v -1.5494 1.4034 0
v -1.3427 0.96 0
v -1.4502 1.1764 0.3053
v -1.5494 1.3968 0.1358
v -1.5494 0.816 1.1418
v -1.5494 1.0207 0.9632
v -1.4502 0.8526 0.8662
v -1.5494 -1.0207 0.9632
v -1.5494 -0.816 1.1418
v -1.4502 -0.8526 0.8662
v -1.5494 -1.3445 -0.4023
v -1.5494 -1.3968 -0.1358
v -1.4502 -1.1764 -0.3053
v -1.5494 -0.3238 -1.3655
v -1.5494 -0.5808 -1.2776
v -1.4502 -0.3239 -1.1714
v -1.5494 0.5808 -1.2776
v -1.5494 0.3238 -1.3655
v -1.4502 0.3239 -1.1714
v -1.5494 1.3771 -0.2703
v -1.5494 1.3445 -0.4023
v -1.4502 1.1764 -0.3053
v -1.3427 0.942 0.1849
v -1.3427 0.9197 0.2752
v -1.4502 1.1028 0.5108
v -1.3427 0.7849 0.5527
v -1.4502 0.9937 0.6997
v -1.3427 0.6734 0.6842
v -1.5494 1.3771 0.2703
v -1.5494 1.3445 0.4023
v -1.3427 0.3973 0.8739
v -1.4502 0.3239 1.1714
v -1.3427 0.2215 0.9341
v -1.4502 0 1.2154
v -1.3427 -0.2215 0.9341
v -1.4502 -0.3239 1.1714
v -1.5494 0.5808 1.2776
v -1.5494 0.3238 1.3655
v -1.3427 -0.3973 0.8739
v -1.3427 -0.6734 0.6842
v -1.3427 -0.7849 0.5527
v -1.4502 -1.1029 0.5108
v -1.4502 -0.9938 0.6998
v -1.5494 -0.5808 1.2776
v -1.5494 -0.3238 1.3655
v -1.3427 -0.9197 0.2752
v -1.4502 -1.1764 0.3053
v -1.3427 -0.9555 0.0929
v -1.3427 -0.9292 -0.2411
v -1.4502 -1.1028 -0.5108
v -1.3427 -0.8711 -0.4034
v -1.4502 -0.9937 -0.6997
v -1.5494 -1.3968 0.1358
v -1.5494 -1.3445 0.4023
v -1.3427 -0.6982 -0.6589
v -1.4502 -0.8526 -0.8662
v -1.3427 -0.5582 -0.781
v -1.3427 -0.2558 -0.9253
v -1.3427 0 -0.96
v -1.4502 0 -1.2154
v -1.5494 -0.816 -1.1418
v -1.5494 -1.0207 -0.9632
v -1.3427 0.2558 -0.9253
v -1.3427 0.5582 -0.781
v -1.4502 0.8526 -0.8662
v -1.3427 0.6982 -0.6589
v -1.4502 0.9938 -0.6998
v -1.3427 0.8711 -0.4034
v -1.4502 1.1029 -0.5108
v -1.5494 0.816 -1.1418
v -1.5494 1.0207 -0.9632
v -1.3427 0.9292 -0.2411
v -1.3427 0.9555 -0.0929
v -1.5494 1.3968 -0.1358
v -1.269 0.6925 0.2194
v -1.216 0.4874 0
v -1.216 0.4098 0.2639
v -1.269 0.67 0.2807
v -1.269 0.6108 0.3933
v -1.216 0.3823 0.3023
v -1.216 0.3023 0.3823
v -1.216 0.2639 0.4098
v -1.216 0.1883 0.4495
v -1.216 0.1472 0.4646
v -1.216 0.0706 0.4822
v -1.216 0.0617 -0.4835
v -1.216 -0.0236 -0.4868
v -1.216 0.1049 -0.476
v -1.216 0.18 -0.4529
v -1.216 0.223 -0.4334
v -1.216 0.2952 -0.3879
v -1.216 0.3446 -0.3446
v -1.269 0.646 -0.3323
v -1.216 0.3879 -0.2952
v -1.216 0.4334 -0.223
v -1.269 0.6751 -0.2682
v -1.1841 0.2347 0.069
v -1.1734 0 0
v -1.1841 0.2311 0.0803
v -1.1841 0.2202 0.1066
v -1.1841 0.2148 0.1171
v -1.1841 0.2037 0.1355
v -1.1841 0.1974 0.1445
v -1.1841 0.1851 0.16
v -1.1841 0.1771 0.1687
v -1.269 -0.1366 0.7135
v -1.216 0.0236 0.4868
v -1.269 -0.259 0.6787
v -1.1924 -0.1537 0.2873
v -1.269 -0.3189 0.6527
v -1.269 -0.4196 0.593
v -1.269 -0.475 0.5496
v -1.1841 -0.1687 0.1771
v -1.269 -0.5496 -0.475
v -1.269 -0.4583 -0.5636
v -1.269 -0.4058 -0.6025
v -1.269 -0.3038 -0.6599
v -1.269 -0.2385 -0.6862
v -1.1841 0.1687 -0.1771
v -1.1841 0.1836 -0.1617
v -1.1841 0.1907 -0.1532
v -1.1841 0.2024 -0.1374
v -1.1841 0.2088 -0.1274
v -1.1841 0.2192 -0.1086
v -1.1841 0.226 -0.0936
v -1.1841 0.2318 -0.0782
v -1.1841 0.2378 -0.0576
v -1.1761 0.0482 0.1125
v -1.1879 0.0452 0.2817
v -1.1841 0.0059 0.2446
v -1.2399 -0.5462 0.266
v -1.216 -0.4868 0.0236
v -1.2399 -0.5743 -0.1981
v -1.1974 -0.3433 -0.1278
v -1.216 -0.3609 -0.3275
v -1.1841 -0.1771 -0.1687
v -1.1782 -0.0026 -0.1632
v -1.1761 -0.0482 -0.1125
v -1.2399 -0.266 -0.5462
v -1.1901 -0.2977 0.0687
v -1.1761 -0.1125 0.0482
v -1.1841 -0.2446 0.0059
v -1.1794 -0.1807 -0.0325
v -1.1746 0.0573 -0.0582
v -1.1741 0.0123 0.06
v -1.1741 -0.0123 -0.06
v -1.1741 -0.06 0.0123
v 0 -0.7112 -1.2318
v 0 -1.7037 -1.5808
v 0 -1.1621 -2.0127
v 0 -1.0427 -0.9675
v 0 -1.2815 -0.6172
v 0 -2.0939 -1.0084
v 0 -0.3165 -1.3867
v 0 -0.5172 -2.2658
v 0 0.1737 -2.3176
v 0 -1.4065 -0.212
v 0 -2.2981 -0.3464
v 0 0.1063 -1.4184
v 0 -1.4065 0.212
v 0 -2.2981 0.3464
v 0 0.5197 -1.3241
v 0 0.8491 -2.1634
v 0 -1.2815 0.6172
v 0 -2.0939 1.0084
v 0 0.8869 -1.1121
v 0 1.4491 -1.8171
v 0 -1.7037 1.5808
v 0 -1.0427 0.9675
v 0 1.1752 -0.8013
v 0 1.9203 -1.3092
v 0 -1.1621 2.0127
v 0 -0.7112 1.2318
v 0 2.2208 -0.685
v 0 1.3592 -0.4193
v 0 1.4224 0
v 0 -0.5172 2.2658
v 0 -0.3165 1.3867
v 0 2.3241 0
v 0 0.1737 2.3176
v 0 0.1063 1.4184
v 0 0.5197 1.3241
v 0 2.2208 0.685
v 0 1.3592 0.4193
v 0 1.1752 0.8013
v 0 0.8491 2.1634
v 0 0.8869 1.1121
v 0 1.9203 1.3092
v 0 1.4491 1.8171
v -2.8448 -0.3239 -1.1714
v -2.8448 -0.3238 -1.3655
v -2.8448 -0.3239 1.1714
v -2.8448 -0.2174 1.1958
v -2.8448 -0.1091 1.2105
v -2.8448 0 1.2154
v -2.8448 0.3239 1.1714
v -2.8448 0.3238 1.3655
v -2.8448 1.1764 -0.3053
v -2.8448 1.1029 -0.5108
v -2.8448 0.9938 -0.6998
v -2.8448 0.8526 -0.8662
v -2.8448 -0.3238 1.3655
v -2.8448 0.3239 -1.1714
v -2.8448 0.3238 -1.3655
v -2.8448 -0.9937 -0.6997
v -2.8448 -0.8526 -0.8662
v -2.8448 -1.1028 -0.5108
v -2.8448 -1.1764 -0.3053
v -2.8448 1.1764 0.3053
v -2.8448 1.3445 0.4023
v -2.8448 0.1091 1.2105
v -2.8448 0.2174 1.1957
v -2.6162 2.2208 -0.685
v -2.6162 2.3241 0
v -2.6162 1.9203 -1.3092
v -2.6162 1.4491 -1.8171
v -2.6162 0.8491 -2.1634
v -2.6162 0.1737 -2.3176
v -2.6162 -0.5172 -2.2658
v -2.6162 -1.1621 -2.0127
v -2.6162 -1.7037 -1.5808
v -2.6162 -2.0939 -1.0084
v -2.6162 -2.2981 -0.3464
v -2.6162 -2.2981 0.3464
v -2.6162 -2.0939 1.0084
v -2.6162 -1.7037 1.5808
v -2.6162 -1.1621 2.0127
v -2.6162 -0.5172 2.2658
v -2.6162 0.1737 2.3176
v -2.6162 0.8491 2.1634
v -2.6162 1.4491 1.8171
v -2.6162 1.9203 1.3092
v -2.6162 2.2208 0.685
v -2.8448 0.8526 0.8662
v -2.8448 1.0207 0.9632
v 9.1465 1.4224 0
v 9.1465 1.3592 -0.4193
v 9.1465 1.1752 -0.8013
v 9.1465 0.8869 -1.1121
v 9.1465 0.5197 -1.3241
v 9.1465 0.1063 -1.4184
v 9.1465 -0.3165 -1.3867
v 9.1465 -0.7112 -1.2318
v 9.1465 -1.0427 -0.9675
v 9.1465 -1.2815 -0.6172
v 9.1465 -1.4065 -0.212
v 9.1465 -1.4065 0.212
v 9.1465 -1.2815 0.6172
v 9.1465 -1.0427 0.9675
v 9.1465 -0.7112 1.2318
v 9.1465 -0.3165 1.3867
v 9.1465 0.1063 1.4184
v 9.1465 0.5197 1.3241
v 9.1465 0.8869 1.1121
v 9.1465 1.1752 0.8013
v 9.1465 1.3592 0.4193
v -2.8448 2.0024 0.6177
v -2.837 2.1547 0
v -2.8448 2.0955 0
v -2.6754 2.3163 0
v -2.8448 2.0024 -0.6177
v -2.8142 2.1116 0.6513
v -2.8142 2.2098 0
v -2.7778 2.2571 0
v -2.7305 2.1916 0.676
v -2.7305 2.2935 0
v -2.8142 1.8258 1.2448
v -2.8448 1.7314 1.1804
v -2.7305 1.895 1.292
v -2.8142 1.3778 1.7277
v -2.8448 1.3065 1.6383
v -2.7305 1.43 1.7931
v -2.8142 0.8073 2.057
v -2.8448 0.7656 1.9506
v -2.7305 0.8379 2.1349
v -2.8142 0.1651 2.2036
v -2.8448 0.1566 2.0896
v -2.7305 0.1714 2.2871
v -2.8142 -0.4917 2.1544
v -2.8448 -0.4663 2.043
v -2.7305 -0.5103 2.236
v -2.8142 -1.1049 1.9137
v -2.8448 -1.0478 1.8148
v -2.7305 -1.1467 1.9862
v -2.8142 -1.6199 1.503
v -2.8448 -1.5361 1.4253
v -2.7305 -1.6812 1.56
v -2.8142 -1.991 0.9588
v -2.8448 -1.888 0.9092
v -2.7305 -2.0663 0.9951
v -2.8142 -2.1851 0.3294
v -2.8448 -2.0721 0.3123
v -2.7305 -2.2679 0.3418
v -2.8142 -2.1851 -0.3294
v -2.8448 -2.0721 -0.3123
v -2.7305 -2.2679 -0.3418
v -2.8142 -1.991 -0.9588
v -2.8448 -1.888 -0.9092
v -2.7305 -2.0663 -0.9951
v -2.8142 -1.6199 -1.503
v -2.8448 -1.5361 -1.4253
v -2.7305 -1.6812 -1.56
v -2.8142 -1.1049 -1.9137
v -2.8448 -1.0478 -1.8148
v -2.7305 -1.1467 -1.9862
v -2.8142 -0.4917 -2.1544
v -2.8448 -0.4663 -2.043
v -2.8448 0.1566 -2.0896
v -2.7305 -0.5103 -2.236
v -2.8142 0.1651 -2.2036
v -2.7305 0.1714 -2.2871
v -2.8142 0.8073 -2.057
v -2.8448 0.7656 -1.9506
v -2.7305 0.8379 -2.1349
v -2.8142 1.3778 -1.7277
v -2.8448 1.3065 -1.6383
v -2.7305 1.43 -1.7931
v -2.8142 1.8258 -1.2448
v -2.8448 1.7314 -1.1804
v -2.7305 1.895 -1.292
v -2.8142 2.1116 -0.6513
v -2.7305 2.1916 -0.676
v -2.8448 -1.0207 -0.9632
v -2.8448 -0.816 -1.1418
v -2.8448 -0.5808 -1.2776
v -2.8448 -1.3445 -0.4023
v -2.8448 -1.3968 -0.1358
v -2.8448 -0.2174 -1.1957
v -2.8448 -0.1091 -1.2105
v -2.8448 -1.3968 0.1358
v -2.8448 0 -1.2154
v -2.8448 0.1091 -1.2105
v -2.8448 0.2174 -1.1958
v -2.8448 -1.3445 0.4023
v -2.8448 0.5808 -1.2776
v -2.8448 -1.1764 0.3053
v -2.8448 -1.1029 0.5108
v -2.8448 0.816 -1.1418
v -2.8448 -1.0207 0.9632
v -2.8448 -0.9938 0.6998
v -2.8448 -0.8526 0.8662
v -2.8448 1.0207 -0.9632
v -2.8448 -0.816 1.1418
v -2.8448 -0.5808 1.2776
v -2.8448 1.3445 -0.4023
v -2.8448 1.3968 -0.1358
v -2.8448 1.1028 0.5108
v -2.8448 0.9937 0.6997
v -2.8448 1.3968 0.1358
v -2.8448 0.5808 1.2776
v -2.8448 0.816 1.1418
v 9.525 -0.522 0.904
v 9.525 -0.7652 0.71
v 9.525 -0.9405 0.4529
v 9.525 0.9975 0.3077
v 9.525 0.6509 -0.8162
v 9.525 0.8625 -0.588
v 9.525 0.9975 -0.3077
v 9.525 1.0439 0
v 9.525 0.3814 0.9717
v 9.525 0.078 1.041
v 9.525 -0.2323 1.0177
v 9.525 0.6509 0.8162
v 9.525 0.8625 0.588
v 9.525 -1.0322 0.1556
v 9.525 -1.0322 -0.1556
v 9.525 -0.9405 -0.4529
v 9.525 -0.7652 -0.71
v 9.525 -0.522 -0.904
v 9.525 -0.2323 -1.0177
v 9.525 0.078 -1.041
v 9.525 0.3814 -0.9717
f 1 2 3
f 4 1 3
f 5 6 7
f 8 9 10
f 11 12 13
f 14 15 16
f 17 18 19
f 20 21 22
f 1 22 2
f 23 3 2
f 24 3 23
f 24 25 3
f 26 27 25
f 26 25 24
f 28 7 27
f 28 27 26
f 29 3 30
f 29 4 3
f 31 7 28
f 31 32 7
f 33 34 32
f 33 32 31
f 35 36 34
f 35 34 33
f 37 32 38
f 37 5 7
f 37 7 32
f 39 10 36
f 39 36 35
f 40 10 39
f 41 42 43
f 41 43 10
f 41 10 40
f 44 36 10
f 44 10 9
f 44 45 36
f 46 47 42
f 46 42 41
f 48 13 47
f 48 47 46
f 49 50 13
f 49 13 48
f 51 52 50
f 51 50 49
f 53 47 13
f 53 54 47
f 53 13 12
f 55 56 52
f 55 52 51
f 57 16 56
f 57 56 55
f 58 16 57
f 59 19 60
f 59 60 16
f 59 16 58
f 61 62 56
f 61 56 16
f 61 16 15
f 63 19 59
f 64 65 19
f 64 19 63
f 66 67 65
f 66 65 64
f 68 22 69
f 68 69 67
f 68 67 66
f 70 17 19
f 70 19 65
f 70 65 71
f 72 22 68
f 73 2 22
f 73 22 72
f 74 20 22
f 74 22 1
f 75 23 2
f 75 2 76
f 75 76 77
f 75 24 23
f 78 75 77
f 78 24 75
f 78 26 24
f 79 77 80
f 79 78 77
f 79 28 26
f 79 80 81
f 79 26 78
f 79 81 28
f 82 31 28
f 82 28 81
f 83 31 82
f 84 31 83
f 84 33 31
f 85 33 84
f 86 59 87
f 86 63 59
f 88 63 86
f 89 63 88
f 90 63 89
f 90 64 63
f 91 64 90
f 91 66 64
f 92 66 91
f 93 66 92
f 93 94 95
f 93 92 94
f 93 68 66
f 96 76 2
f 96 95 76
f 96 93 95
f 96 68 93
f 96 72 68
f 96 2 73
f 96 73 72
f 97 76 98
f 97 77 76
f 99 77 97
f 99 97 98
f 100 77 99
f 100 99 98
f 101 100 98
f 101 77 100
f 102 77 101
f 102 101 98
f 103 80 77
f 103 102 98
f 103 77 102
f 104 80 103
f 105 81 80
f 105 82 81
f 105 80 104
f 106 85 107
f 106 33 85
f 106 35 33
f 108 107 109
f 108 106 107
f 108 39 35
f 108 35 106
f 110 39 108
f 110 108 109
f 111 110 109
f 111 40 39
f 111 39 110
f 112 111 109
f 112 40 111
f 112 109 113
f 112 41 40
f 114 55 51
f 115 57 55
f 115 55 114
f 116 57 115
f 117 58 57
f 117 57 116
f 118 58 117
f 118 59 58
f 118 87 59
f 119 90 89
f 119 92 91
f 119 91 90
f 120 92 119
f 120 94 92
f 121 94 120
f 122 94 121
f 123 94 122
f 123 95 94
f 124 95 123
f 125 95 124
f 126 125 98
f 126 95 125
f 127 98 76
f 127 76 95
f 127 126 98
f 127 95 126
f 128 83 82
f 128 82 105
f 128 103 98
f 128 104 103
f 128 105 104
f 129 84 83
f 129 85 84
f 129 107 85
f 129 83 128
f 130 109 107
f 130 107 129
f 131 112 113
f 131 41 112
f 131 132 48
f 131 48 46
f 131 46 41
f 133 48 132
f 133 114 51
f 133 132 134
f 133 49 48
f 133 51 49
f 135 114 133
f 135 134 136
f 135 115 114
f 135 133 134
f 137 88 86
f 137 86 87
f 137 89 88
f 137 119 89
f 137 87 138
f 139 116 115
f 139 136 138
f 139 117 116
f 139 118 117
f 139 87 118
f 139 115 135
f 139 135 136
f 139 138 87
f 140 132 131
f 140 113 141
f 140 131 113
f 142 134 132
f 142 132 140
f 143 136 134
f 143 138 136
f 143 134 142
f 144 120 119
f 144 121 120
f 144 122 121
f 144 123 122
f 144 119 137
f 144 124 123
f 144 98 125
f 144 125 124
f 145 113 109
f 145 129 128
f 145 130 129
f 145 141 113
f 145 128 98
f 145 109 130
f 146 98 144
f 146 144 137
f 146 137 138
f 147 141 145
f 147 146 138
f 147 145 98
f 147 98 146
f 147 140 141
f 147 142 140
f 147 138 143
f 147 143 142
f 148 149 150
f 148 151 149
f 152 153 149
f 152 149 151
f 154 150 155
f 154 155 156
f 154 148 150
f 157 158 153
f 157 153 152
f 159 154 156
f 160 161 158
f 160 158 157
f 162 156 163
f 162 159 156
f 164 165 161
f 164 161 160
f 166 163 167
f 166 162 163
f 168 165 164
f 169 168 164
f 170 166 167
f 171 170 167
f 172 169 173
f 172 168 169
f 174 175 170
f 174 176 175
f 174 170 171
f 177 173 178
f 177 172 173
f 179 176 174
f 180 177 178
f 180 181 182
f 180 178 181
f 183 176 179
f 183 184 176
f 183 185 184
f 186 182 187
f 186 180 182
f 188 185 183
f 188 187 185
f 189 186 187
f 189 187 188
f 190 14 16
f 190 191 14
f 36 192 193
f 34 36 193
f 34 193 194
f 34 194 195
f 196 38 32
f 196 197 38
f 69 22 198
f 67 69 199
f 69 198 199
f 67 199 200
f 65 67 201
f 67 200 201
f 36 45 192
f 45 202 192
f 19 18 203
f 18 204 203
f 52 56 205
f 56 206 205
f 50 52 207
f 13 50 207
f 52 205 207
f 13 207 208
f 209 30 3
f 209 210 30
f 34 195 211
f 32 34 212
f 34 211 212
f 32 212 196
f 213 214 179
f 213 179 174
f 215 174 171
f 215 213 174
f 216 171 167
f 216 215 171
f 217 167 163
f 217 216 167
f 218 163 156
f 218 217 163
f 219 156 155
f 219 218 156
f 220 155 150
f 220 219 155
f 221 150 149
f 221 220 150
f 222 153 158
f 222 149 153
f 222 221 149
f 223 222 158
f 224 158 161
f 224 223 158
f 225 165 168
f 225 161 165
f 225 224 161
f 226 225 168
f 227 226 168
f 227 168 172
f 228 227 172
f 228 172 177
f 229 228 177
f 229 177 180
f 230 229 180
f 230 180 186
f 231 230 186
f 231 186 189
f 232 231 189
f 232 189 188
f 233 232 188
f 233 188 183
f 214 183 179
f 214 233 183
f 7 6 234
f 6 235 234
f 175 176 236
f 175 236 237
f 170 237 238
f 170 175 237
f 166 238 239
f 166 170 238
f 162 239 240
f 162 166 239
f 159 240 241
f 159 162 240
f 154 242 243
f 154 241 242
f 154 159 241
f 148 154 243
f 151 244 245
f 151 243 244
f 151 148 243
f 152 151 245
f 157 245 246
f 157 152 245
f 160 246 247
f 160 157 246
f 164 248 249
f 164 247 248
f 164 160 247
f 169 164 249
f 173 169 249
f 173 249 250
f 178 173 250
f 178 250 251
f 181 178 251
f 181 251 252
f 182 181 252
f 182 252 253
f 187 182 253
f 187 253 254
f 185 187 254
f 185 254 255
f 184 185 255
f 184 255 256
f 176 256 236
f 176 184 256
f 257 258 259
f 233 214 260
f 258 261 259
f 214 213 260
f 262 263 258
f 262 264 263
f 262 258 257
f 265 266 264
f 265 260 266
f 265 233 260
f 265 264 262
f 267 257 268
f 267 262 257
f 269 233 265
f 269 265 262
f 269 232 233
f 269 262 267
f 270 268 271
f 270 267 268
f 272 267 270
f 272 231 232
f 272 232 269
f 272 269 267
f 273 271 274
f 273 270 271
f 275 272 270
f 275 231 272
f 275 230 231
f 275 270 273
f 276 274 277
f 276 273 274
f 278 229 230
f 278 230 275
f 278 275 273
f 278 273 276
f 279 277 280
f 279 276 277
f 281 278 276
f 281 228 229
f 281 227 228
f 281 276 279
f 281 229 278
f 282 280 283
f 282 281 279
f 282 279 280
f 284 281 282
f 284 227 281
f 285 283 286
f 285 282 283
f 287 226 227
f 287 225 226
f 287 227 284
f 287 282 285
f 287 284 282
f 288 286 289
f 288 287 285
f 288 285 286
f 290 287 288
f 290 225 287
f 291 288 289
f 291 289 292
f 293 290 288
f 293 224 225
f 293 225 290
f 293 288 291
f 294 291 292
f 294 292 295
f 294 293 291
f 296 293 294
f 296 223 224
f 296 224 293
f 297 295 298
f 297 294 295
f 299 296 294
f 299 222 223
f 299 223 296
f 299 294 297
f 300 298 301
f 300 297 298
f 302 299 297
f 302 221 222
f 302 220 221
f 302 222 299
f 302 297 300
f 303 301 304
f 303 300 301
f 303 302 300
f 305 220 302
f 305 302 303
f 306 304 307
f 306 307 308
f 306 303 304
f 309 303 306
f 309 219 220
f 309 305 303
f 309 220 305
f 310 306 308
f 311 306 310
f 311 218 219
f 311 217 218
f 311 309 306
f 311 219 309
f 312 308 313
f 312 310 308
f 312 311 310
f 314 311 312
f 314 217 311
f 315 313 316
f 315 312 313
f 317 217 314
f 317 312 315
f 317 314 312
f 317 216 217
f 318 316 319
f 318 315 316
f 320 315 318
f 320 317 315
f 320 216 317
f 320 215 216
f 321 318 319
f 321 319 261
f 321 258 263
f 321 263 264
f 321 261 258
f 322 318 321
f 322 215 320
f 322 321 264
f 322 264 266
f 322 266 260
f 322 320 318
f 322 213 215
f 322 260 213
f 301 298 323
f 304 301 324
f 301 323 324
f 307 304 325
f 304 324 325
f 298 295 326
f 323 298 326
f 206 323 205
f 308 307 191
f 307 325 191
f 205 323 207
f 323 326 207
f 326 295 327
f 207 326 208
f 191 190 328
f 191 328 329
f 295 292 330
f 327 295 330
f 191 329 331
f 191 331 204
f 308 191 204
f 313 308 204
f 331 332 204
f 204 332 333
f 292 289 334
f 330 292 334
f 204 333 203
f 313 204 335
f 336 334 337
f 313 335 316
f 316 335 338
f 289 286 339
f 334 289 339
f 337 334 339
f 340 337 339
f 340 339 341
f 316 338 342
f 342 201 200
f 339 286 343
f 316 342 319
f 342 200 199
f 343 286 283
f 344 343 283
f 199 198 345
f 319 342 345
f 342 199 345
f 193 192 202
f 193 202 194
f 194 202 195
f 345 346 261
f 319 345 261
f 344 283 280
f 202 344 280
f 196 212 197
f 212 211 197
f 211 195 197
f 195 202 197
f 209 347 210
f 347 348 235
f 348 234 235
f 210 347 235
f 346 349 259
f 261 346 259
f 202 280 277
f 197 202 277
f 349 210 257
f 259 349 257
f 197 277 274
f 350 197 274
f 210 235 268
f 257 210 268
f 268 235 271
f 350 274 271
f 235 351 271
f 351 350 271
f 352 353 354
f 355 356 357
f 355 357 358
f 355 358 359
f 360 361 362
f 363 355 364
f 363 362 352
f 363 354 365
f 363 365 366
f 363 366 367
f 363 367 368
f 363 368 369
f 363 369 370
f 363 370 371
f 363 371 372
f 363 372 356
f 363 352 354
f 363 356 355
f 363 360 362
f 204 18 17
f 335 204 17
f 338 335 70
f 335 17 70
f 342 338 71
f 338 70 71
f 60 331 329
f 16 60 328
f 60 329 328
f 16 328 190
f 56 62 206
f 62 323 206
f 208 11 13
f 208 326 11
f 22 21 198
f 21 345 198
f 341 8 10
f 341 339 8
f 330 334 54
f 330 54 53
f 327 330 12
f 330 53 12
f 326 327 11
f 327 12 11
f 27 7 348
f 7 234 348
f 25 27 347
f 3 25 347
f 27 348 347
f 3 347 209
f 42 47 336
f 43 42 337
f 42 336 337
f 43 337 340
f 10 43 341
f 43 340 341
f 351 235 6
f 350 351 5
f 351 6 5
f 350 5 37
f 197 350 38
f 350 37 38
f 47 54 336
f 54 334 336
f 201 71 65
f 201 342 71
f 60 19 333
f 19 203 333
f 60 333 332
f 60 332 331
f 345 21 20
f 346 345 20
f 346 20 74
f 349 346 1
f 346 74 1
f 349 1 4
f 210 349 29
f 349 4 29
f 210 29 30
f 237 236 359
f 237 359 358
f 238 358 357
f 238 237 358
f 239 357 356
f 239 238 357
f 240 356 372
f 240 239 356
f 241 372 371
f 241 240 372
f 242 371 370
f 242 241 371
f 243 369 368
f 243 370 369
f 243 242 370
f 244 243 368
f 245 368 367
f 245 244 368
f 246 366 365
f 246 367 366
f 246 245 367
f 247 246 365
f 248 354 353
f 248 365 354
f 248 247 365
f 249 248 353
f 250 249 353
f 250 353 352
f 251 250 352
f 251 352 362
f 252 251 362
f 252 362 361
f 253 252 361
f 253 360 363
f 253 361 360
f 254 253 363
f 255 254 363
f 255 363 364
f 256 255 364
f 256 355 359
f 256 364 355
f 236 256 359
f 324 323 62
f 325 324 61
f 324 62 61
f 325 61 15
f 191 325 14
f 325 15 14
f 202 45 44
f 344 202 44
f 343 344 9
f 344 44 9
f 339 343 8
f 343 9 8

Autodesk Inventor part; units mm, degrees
ref_plane "YZ Plane" through (0, 0, 0) normal (1, 0, 0) x (0, 1, 0)
sketch "Sketch1" plane through (0, 0, 0) normal (0, 0, 1) x (1, 0, 0)
  line L0 (-2.8448, 0) -> (9.525, 0)
  line L1 (9.525, 0) -> (9.525, 1.4224)
  line L2 (9.525, 1.4224) -> (0, 1.4224)
  line L3 (0, 1.4224) -> (0, 2.3241)
  line L4 (-7.3162, 0) -> (16.036, 0) projected
  line L5 (0, -0.4648) -> (0, 2.7889) projected
  line L6 (0, 2.3241) -> (-2.8448, 2.3241)
  line L7 (-2.8448, 0) -> (-2.8448, 2.3241)
  arc A0 (-1.1734, 0) -> (-1.5494, 1.4034) centre (-3.9802, 0) ccw
  line L8 (-2.8448, 1.4034) -> (-1.5494, 1.4034)
  line L9 (12.7, 1.4224) -> (0, 1.4224) construction
  dimension "d0" = 9.525
  dimension "d1" = 2.8448
  dimension "d2" = 2.8448
  dimension "d5" = 4.6482
  dimension "d13" = 2.8068
  dimension "d14" = 2.8068
  dimension "d15" = 1.2954
revolve "Body" add sketch "Sketch1" angle 360 about axis through (-2.8448, 0, 0) along (1, 0, 0) contours A0 L8 L7 L6 L3 L5 L0 | L5 L2 L1 L0
ref_plane "IDS_WORKPLANE{1}" through (-2.8448, 0, 0) normal (1, 0, 0) x (0, 0, -1)
sketch "Sketch2" plane through (-2.8448, 0, 0) normal (1, 0, 0) x (0, 0, -1)
  line L0 (0, -3.6027) -> (0, 5.3473) projected
  line L1 (5.6384, 0) -> (-3.6512, 0) projected
  circle A0 centre (0, 0) radius 2.3241 projected
  line L2 (1.3655, 0.3238) -> (1.1714, 0.3239)
  line L3 (0, 0) -> (1.3655, 0.3238) construction
  line L4 (0, 0) -> (4.3113, 4.0687) construction
  line L5 (0, 0) -> (0.4023, 1.3445) construction
  line L6 (0, 0) -> (0.7017, 1.2154) construction
  line L7 (0.4023, 1.3445) -> (0.3053, 1.1764)
  line L8 (0.9632, 1.0207) -> (0.8662, 0.8526)
  line L9 (0, 0) -> (0.9632, 1.0207) construction
  arc A1 (1.2154, 0) -> (1.1714, 0.3239) centre (0, 0) ccw
  arc A2 (0.8662, 0.8526) -> (0.3053, 1.1764) centre (0, 0) ccw
  arc A3 (1.4034, 0) -> (1.3655, 0.3238) centre (0, 0) ccw
  arc A4 (0.9632, 1.0207) -> (0.4023, 1.3445) centre (0, 0) ccw
  arc A5 (1.3655, 0.3238) -> (0.8276, 1.1334) centre (0, 0) ccw construction
  arc A6 (1.1714, 0.3239) -> (0.8662, 0.8526) centre (0, 0) ccw construction
  line L10 (1.3655, -0.3238) -> (1.1714, -0.3239)
  line L11 (0.4023, -1.3445) -> (0.3053, -1.1764)
  line L12 (0.9632, -1.0207) -> (0.8662, -0.8526)
  arc A7 (1.1714, -0.3239) -> (1.2154, 0) centre (0, 0) ccw
  arc A8 (0.3053, -1.1764) -> (0.8662, -0.8526) centre (0, 0) ccw
  arc A9 (1.3655, -0.3238) -> (1.4034, 0) centre (0, 0) ccw
  arc A10 (0.4023, -1.3445) -> (0.9632, -1.0207) centre (0, 0) ccw
  line L13 (-1.3655, 0.3238) -> (-1.1714, 0.3239)
  line L14 (-0.4023, 1.3445) -> (-0.3053, 1.1764)
  line L15 (-0.9632, 1.0207) -> (-0.8662, 0.8526)
  arc A11 (-1.1714, 0.3239) -> (-1.2154, 0) centre (0, 0) ccw
  arc A12 (-0.3053, 1.1764) -> (-0.8662, 0.8526) centre (0, 0) ccw
  arc A13 (-1.3655, 0.3238) -> (-1.4034, 0) centre (0, 0) ccw
  arc A14 (-0.4023, 1.3445) -> (-0.9632, 1.0207) centre (0, 0) ccw
  line L16 (-0.4023, -1.3445) -> (-0.3053, -1.1764)
  arc A15 (-0.8662, -0.8526) -> (-0.3053, -1.1764) centre (0, 0) ccw
  line L17 (-0.9632, -1.0207) -> (-0.8662, -0.8526)
  arc A16 (-0.9632, -1.0207) -> (-0.4023, -1.3445) centre (0, 0) ccw
  arc A17 (-1.2154, 0) -> (-1.1714, -0.3239) centre (0, 0) ccw
  line L18 (-1.3655, -0.3238) -> (-1.1714, -0.3239)
  arc A18 (-1.4034, 0) -> (-1.3655, -0.3238) centre (0, 0) ccw
  point P0 (0.7017, -1.2154)
  point P1 (-0.7017, 1.2154)
  point P2 (-0.7017, -1.2154)
  dimension "d19" = 0.3239
  dimension "d20" = 0.6477
  dimension "d21" = 33.316
  dimension "d22" = 2.8068
  dimension "d23" = 2.4308
extrude "Slot" add sketch "Sketch2" along normal up to next contours A1 L2 A3 L1 | L1 A9 L10 A7 | A17 L18 A18 L1 | L1 A13 L13 A11 | A4 L8 A2 L7 | L11 A8 L12 A10 | L14 A12 L15 A14 | A16 L17 A15 L16
fillet "Fillet1" radius 0.2286 1 edges at (-2.8448, -2.3241, 0)
thread "Thread" size "4-40 UNC" class "2A" standard "ANSI Unified Screw Threads" length 7.9375
chamfer "Chamfer1" distance 0.3785 distance2 0.3785 1 edges at (9.525, -1.4224, 0) measured on face at (9.525, -0.2537, -0.5191)
ref_plane "Work Plane2" through (-1.4224, 0, 0) normal (0, 0, -1) x (1, 0, 0)
equation "\"d19\" = 0.5 * SBR"
equation "\"d20\" = SBR"
equation "\"d22\" = 1.1547 * SW"
equation "\"d23\" = SW"
equation "\"d17\" = INTI"
equation "\"d24\" = RR"
equation "\"d6\" = GEL"
equation "\"d9\" = -0.5 * SPD + 0.5 * NND"
equation "\"d10\" = GUL"
equation "\"d0\" = NLG"
equation "\"d1\" = KOH"
equation "\"d2\" = NND"
equation "\"d5\" = KOD"
equation "\"d13\" = 1.1547 * SW"
equation "\"d14\" = 1.1547 * SW"
equation "\"d15\" = INTI"
equation "\"NND\" = 2.8448"
equation "\"NLG\" = 9.525"
equation "\"GEL\" = 7.9375"
equation "\"KOD\" = 4.6482"
equation "\"KOH\" = 2.8448"
equation "\"SPD\" = GD1"
equation "\"GUL\" = 0.37846"
equation "\"SBR\" = 0.6477"
equation "\"INTI\" = 1.2954"
equation "\"d11\" = -KOH"
equation "\"SW\" = 2.43078"
equation "\"d16\" = 1.1547 * SW"
equation "\"d18\" = SW"
equation "\"RR\" = 0.2286"
equation "\"TOA\" = 30deg"
equation "\"GD1\" = 2.08788"
equation "\"THREADDIA\" = 2.8448"
equation "\"BDM\" = NND"
equation "\"GD\" = NND"
equation "\"GAL\" = 1.5875"
equation "\"E0\" = 2.86258"
properties part number "ANSI B18.3 - 4-40 UNC - 0.375, SSHCSI" material "Steel, Mild"
